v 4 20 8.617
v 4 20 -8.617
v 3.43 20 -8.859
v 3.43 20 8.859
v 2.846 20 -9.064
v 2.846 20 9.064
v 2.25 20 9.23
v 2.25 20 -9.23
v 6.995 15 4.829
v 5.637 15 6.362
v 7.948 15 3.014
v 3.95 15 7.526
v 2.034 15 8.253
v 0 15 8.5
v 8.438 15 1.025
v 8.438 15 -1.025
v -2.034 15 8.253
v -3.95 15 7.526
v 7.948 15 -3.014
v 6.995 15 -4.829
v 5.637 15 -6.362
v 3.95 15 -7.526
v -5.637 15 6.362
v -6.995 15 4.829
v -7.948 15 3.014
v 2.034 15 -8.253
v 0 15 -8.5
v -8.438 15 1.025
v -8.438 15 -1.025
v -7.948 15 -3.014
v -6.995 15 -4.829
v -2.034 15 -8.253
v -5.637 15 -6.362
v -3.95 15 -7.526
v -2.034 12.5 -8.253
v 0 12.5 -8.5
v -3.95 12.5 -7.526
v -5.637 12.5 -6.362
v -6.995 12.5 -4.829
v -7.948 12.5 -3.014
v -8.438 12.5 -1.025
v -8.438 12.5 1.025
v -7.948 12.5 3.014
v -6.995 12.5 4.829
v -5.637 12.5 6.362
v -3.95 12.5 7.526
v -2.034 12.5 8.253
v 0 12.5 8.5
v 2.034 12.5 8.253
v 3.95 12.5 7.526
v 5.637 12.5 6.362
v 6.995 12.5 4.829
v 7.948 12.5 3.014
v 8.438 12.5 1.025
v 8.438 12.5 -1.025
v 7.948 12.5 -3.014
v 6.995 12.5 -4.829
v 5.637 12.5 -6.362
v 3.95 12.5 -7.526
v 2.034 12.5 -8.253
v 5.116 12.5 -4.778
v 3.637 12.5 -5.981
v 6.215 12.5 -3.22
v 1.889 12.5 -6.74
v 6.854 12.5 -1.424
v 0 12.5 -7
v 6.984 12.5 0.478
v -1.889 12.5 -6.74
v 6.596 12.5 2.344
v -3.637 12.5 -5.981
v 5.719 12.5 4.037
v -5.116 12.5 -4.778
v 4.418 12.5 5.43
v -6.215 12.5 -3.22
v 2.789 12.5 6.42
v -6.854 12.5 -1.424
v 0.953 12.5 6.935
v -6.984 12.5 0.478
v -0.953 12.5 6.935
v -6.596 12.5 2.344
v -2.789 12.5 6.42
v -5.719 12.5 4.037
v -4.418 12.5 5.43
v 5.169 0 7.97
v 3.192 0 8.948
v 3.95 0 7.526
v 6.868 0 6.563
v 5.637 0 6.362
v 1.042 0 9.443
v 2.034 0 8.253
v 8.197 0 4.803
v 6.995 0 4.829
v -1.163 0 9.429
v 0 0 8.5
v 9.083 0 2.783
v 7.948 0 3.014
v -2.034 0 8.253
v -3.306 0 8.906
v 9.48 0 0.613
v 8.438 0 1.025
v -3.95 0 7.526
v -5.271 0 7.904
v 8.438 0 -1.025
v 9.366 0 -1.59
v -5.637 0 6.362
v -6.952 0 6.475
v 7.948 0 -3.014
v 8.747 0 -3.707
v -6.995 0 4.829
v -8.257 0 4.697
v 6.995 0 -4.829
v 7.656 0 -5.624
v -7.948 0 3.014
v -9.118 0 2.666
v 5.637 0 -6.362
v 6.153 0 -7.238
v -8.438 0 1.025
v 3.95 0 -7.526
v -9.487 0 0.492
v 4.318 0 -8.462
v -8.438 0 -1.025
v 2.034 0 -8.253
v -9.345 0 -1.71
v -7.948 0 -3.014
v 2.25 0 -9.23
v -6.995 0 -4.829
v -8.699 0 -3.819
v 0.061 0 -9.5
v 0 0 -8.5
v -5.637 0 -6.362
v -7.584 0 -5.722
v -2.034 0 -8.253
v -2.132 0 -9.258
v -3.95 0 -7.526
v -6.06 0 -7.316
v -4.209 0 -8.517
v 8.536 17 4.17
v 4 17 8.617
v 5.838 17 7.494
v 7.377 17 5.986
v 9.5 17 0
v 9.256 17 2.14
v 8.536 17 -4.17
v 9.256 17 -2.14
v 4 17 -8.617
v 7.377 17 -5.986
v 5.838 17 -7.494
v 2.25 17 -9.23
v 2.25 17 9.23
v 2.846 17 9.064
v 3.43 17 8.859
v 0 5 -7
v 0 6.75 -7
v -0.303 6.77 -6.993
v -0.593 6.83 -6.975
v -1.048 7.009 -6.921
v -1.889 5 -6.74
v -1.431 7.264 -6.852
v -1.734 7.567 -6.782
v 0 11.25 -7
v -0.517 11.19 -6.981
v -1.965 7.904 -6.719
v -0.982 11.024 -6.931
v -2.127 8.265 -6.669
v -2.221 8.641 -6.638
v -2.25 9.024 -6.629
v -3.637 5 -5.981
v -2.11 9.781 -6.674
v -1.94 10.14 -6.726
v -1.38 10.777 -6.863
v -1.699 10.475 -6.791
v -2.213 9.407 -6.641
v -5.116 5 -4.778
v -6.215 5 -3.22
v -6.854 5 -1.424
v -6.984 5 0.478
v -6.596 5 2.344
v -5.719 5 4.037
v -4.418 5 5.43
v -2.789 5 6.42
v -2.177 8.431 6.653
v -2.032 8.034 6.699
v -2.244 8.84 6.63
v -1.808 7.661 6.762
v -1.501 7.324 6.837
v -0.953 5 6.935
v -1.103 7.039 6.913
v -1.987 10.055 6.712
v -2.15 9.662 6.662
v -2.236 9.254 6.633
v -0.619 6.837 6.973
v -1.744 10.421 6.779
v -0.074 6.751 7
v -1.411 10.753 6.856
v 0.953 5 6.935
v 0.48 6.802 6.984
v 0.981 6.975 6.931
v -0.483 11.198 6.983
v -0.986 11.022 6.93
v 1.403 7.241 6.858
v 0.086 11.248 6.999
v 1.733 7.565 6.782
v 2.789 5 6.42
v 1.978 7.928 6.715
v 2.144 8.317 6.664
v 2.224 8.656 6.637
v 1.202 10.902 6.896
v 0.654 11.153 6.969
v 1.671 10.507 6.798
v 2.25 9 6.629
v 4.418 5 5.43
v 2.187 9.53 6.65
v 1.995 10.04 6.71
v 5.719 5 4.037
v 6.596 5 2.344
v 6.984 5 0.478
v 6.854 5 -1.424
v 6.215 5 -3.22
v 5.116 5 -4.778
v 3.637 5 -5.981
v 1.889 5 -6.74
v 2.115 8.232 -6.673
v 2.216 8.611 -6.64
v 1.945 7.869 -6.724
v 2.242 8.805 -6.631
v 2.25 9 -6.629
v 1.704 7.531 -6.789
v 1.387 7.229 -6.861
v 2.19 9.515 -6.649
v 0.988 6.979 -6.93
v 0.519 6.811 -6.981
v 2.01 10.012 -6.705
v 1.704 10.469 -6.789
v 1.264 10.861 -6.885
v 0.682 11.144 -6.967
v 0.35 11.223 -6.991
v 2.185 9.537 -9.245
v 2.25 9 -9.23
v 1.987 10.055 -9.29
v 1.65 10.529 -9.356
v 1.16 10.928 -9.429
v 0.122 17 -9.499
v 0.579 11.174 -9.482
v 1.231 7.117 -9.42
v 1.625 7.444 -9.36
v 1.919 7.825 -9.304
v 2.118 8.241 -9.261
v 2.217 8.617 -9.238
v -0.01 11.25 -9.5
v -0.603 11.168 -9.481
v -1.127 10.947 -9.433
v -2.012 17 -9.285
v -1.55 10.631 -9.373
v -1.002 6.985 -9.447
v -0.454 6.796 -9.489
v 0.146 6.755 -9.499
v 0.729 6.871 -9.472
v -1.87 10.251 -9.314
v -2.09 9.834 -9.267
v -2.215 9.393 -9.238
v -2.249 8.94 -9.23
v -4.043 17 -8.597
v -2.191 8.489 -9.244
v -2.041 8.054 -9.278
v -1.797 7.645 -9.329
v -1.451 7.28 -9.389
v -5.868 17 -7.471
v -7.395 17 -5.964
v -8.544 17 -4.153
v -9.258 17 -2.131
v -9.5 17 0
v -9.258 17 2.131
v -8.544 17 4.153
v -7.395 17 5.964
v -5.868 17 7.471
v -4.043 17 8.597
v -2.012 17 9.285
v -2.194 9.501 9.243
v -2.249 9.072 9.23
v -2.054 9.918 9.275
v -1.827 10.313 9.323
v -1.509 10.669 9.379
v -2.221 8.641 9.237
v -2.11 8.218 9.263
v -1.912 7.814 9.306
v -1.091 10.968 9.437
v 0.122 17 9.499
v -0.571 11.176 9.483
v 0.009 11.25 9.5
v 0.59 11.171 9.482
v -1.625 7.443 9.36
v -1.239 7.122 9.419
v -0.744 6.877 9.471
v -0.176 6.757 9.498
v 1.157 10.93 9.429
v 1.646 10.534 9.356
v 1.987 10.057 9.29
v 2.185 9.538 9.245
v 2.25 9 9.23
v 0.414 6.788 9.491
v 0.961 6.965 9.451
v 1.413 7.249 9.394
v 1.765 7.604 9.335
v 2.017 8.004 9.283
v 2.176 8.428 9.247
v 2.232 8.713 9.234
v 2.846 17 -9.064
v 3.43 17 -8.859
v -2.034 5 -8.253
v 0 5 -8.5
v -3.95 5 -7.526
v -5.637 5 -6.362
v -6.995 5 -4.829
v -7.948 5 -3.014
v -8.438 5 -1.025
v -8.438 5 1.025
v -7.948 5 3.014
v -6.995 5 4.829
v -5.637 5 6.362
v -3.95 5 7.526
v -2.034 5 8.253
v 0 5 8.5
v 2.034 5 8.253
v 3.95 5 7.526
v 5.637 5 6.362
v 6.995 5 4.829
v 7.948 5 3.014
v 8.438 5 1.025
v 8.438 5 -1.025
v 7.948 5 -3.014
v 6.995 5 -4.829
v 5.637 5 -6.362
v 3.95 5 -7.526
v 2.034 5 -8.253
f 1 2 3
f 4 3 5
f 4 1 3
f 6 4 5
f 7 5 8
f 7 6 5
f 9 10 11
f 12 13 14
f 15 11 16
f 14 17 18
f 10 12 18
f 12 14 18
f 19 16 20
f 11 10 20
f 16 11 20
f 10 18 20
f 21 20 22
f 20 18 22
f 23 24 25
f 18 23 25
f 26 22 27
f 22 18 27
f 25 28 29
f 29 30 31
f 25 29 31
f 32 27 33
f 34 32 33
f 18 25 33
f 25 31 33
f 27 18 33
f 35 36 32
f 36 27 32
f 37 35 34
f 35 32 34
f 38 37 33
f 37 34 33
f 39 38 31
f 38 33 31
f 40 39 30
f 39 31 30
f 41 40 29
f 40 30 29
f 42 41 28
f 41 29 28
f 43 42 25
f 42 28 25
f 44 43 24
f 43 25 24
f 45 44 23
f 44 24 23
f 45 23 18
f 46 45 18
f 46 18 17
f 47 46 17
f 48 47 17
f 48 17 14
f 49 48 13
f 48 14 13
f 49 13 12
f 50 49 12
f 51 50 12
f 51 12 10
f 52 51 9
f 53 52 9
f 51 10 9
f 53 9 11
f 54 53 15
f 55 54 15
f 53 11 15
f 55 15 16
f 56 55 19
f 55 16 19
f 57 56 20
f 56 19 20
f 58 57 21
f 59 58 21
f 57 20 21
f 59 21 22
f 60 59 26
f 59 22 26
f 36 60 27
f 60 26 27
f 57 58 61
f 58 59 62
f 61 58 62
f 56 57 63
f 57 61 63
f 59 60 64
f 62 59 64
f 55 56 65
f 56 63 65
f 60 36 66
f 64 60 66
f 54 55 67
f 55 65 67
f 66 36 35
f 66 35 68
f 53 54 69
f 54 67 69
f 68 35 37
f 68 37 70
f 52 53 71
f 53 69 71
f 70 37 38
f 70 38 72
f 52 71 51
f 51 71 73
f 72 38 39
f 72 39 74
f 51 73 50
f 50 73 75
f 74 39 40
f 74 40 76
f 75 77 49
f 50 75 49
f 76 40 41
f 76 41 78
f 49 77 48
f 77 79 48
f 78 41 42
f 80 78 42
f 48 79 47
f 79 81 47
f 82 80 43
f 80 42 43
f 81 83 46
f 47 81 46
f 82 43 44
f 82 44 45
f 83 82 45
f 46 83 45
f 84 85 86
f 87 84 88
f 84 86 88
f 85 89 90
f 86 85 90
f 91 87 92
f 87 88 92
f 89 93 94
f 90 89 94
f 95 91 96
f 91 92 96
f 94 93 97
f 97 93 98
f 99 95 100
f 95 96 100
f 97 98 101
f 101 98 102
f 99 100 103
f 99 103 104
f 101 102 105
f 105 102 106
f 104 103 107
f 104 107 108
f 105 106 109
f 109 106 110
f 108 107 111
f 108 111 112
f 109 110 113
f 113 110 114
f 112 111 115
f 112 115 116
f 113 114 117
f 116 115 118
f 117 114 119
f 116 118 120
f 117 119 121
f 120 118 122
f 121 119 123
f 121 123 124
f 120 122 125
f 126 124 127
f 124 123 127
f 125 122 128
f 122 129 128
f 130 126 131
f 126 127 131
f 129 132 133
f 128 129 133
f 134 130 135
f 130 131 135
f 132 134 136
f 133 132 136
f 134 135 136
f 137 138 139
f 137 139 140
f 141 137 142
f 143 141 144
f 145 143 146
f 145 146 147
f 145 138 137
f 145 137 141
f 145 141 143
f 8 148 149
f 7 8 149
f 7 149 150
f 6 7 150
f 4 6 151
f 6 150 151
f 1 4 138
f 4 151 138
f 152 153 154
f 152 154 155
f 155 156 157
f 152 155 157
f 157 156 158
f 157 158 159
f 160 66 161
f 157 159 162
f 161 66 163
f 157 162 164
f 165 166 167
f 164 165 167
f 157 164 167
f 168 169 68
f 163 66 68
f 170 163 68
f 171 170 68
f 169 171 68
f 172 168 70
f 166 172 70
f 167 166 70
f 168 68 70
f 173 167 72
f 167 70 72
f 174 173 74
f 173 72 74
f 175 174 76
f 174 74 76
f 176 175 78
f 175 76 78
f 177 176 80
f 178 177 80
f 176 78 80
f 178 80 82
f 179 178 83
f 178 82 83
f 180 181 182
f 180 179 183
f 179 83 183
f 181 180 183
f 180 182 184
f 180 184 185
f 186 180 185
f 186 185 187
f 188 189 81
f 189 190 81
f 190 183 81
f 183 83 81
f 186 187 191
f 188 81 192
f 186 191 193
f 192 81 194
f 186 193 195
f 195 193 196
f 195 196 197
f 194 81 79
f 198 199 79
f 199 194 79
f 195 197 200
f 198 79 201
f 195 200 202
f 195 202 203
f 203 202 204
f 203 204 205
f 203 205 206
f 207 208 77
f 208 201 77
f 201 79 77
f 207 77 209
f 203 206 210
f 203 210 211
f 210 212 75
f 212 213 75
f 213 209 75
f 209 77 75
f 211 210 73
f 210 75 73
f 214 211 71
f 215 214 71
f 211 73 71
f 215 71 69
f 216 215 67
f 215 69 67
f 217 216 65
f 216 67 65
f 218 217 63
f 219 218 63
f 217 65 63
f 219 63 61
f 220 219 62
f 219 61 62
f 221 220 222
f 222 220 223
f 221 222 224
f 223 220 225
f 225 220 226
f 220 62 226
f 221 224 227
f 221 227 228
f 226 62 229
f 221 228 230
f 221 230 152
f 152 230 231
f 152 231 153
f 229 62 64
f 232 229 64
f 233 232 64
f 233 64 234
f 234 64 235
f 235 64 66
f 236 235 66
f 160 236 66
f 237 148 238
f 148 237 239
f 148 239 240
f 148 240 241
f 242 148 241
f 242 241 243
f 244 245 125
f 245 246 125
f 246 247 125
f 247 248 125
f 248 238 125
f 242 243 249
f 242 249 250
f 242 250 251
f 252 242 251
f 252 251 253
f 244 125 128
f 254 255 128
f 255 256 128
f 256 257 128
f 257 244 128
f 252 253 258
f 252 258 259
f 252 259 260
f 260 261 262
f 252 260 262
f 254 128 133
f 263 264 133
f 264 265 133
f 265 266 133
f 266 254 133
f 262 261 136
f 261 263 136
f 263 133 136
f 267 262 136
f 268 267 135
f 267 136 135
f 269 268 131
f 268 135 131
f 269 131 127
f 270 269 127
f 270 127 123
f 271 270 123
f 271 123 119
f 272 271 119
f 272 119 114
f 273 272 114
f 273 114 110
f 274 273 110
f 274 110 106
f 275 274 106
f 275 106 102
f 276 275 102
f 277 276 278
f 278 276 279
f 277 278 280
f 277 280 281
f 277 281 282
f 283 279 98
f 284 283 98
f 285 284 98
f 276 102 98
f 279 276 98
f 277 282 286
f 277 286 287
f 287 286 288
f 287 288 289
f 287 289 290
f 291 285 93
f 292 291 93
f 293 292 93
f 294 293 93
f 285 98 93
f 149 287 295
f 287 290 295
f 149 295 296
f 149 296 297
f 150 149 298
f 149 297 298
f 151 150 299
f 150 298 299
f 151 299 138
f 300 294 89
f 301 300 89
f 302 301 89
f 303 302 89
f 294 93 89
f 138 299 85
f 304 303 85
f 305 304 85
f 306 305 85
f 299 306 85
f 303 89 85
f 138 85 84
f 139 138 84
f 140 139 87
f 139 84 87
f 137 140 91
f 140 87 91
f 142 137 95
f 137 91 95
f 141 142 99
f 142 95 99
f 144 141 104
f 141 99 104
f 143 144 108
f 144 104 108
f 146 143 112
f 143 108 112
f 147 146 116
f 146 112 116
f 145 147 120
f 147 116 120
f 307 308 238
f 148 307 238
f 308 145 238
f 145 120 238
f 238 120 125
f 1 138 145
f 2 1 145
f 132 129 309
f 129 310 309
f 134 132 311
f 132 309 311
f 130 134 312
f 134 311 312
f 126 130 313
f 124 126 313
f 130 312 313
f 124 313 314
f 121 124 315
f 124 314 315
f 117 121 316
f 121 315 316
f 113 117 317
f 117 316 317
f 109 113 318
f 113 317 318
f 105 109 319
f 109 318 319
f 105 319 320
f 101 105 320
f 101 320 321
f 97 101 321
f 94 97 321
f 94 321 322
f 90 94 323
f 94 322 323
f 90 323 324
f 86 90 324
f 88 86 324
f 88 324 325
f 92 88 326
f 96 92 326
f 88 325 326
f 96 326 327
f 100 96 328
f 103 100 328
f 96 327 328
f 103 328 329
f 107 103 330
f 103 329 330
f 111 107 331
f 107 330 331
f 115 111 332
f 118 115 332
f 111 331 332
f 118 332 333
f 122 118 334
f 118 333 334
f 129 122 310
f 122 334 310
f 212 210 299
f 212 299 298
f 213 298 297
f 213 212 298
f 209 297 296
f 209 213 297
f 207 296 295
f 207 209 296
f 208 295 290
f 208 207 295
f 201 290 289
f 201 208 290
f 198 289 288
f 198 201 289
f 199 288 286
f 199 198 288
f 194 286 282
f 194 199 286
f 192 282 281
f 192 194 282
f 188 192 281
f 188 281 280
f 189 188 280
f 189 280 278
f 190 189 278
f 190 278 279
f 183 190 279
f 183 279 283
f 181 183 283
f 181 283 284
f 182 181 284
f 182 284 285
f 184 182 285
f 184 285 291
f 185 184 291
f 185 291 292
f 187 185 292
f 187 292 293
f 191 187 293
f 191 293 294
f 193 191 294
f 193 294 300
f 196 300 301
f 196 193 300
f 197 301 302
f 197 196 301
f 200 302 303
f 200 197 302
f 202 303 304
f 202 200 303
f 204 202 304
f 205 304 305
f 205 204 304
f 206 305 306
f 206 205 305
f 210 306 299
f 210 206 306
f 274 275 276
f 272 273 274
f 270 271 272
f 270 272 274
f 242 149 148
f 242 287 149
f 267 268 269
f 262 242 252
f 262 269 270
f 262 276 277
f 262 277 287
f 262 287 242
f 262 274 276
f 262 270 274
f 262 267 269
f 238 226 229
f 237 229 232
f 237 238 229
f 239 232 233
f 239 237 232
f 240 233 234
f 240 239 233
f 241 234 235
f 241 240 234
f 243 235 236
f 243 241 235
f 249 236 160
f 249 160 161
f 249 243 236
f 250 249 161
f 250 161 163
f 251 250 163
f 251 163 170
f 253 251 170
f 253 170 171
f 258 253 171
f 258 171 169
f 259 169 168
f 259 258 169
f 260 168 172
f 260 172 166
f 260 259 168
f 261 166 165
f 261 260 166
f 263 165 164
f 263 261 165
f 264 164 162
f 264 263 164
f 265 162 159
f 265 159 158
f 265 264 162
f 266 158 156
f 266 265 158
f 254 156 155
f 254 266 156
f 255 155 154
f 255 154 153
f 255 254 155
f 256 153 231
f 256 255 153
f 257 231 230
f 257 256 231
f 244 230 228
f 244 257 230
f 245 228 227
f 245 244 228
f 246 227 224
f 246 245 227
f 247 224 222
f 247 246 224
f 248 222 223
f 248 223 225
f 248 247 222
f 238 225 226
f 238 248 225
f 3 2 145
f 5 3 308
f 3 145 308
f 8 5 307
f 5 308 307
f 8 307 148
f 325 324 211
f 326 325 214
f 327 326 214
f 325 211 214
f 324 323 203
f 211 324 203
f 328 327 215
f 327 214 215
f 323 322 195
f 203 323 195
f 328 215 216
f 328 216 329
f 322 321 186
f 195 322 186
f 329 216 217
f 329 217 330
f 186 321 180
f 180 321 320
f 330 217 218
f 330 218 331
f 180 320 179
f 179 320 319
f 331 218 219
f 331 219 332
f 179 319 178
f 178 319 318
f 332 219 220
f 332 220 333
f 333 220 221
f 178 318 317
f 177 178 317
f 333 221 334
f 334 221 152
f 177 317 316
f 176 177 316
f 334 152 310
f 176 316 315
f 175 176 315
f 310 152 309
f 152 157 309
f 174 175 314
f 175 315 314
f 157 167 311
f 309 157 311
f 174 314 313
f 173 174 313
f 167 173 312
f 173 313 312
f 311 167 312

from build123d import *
from build123d.topology import SkipClean

# Parameters (mm, degrees)
ESQUISSE1_R                  = 9.5
BASE_EXTRUSION_DEPTH         = 17
BOSS_EXTRU_1_DEPTH           = 3
ENL_V_MAT_EXTRU_1_DEPTH      = 25.093567606
ENL_V_MAT_EXTRU_1_DEPTH_BACK = 25.093567606
ESQUISSE4_R                  = 2.25


with BuildPart() as part:
    # Esquisse1 → Base-Extrusion (new body)
    with BuildSketch(Plane(origin=(0, 0, 0), x_dir=(1, 0, 0), z_dir=(0, 1, 0))):
        with Locations(Location((0, 0, 0), (0, 0, 76.299766512))):
            Circle(ESQUISSE1_R)
    extrude(amount=BASE_EXTRUSION_DEPTH)

    # Esquisse2 → Boss.-Extru.1 (add)
    with SkipClean():  # the faces are left unmerged after this step: merging them gives an invalid solid
        with BuildSketch(Plane(origin=(0, 17, 0), x_dir=(-1, 0, 0), z_dir=(0, 1, 0))):
            with BuildLine():
                Line((-2.25, -9.229707471), (-2.25, 9.229707471))
                ThreePointArc((-2.25, 9.229707471), (-3.139988124, 8.966073532), (-4, 8.61684397))
                Line((-4, 8.61684397), (-4, -8.61684397))
                ThreePointArc((-4, -8.61684397), (-3.139988124, -8.966073532), (-2.25, -9.229707471))
            make_face()
        extrude(amount=BOSS_EXTRU_1_DEPTH)

    # Esquisse3 → Enlèvement de matière-Révolution1 (revolve, cut)
    with SkipClean():  # the faces are left unmerged after this step: merging them gives an invalid solid
        with BuildSketch(Plane.XY, mode=Mode.PRIVATE) as enl_vement_de_mati_re_r_volution1_sk:
            Polygon((8.5, 0), (8.5, 5), (7, 5), (7, 12.5), (8.5, 12.5), (8.5, 15), (0, 15), (0, 0), align=None)
        revolve(enl_vement_de_mati_re_r_volution1_sk.sketch.rotate(Axis((0, 0, 0), (0, 1, 0)), 90), axis=Axis((0, 0, 0), (0, 1, 0)), mode=Mode.SUBTRACT)

    # Esquisse4 → Enlèv. mat.-Extru.1 (cut, two sides: drawn at the far end of the back side and taken through both)
    with SkipClean():  # the faces are left unmerged after this step: merging them gives an invalid solid
        with BuildSketch(Plane.XY.offset(-ENL_V_MAT_EXTRU_1_DEPTH_BACK)):
            with Locations((0, 9)):
                Circle(ESQUISSE4_R)
        extrude(amount=ENL_V_MAT_EXTRU_1_DEPTH + ENL_V_MAT_EXTRU_1_DEPTH_BACK, mode=Mode.SUBTRACT)


solid = part.part
